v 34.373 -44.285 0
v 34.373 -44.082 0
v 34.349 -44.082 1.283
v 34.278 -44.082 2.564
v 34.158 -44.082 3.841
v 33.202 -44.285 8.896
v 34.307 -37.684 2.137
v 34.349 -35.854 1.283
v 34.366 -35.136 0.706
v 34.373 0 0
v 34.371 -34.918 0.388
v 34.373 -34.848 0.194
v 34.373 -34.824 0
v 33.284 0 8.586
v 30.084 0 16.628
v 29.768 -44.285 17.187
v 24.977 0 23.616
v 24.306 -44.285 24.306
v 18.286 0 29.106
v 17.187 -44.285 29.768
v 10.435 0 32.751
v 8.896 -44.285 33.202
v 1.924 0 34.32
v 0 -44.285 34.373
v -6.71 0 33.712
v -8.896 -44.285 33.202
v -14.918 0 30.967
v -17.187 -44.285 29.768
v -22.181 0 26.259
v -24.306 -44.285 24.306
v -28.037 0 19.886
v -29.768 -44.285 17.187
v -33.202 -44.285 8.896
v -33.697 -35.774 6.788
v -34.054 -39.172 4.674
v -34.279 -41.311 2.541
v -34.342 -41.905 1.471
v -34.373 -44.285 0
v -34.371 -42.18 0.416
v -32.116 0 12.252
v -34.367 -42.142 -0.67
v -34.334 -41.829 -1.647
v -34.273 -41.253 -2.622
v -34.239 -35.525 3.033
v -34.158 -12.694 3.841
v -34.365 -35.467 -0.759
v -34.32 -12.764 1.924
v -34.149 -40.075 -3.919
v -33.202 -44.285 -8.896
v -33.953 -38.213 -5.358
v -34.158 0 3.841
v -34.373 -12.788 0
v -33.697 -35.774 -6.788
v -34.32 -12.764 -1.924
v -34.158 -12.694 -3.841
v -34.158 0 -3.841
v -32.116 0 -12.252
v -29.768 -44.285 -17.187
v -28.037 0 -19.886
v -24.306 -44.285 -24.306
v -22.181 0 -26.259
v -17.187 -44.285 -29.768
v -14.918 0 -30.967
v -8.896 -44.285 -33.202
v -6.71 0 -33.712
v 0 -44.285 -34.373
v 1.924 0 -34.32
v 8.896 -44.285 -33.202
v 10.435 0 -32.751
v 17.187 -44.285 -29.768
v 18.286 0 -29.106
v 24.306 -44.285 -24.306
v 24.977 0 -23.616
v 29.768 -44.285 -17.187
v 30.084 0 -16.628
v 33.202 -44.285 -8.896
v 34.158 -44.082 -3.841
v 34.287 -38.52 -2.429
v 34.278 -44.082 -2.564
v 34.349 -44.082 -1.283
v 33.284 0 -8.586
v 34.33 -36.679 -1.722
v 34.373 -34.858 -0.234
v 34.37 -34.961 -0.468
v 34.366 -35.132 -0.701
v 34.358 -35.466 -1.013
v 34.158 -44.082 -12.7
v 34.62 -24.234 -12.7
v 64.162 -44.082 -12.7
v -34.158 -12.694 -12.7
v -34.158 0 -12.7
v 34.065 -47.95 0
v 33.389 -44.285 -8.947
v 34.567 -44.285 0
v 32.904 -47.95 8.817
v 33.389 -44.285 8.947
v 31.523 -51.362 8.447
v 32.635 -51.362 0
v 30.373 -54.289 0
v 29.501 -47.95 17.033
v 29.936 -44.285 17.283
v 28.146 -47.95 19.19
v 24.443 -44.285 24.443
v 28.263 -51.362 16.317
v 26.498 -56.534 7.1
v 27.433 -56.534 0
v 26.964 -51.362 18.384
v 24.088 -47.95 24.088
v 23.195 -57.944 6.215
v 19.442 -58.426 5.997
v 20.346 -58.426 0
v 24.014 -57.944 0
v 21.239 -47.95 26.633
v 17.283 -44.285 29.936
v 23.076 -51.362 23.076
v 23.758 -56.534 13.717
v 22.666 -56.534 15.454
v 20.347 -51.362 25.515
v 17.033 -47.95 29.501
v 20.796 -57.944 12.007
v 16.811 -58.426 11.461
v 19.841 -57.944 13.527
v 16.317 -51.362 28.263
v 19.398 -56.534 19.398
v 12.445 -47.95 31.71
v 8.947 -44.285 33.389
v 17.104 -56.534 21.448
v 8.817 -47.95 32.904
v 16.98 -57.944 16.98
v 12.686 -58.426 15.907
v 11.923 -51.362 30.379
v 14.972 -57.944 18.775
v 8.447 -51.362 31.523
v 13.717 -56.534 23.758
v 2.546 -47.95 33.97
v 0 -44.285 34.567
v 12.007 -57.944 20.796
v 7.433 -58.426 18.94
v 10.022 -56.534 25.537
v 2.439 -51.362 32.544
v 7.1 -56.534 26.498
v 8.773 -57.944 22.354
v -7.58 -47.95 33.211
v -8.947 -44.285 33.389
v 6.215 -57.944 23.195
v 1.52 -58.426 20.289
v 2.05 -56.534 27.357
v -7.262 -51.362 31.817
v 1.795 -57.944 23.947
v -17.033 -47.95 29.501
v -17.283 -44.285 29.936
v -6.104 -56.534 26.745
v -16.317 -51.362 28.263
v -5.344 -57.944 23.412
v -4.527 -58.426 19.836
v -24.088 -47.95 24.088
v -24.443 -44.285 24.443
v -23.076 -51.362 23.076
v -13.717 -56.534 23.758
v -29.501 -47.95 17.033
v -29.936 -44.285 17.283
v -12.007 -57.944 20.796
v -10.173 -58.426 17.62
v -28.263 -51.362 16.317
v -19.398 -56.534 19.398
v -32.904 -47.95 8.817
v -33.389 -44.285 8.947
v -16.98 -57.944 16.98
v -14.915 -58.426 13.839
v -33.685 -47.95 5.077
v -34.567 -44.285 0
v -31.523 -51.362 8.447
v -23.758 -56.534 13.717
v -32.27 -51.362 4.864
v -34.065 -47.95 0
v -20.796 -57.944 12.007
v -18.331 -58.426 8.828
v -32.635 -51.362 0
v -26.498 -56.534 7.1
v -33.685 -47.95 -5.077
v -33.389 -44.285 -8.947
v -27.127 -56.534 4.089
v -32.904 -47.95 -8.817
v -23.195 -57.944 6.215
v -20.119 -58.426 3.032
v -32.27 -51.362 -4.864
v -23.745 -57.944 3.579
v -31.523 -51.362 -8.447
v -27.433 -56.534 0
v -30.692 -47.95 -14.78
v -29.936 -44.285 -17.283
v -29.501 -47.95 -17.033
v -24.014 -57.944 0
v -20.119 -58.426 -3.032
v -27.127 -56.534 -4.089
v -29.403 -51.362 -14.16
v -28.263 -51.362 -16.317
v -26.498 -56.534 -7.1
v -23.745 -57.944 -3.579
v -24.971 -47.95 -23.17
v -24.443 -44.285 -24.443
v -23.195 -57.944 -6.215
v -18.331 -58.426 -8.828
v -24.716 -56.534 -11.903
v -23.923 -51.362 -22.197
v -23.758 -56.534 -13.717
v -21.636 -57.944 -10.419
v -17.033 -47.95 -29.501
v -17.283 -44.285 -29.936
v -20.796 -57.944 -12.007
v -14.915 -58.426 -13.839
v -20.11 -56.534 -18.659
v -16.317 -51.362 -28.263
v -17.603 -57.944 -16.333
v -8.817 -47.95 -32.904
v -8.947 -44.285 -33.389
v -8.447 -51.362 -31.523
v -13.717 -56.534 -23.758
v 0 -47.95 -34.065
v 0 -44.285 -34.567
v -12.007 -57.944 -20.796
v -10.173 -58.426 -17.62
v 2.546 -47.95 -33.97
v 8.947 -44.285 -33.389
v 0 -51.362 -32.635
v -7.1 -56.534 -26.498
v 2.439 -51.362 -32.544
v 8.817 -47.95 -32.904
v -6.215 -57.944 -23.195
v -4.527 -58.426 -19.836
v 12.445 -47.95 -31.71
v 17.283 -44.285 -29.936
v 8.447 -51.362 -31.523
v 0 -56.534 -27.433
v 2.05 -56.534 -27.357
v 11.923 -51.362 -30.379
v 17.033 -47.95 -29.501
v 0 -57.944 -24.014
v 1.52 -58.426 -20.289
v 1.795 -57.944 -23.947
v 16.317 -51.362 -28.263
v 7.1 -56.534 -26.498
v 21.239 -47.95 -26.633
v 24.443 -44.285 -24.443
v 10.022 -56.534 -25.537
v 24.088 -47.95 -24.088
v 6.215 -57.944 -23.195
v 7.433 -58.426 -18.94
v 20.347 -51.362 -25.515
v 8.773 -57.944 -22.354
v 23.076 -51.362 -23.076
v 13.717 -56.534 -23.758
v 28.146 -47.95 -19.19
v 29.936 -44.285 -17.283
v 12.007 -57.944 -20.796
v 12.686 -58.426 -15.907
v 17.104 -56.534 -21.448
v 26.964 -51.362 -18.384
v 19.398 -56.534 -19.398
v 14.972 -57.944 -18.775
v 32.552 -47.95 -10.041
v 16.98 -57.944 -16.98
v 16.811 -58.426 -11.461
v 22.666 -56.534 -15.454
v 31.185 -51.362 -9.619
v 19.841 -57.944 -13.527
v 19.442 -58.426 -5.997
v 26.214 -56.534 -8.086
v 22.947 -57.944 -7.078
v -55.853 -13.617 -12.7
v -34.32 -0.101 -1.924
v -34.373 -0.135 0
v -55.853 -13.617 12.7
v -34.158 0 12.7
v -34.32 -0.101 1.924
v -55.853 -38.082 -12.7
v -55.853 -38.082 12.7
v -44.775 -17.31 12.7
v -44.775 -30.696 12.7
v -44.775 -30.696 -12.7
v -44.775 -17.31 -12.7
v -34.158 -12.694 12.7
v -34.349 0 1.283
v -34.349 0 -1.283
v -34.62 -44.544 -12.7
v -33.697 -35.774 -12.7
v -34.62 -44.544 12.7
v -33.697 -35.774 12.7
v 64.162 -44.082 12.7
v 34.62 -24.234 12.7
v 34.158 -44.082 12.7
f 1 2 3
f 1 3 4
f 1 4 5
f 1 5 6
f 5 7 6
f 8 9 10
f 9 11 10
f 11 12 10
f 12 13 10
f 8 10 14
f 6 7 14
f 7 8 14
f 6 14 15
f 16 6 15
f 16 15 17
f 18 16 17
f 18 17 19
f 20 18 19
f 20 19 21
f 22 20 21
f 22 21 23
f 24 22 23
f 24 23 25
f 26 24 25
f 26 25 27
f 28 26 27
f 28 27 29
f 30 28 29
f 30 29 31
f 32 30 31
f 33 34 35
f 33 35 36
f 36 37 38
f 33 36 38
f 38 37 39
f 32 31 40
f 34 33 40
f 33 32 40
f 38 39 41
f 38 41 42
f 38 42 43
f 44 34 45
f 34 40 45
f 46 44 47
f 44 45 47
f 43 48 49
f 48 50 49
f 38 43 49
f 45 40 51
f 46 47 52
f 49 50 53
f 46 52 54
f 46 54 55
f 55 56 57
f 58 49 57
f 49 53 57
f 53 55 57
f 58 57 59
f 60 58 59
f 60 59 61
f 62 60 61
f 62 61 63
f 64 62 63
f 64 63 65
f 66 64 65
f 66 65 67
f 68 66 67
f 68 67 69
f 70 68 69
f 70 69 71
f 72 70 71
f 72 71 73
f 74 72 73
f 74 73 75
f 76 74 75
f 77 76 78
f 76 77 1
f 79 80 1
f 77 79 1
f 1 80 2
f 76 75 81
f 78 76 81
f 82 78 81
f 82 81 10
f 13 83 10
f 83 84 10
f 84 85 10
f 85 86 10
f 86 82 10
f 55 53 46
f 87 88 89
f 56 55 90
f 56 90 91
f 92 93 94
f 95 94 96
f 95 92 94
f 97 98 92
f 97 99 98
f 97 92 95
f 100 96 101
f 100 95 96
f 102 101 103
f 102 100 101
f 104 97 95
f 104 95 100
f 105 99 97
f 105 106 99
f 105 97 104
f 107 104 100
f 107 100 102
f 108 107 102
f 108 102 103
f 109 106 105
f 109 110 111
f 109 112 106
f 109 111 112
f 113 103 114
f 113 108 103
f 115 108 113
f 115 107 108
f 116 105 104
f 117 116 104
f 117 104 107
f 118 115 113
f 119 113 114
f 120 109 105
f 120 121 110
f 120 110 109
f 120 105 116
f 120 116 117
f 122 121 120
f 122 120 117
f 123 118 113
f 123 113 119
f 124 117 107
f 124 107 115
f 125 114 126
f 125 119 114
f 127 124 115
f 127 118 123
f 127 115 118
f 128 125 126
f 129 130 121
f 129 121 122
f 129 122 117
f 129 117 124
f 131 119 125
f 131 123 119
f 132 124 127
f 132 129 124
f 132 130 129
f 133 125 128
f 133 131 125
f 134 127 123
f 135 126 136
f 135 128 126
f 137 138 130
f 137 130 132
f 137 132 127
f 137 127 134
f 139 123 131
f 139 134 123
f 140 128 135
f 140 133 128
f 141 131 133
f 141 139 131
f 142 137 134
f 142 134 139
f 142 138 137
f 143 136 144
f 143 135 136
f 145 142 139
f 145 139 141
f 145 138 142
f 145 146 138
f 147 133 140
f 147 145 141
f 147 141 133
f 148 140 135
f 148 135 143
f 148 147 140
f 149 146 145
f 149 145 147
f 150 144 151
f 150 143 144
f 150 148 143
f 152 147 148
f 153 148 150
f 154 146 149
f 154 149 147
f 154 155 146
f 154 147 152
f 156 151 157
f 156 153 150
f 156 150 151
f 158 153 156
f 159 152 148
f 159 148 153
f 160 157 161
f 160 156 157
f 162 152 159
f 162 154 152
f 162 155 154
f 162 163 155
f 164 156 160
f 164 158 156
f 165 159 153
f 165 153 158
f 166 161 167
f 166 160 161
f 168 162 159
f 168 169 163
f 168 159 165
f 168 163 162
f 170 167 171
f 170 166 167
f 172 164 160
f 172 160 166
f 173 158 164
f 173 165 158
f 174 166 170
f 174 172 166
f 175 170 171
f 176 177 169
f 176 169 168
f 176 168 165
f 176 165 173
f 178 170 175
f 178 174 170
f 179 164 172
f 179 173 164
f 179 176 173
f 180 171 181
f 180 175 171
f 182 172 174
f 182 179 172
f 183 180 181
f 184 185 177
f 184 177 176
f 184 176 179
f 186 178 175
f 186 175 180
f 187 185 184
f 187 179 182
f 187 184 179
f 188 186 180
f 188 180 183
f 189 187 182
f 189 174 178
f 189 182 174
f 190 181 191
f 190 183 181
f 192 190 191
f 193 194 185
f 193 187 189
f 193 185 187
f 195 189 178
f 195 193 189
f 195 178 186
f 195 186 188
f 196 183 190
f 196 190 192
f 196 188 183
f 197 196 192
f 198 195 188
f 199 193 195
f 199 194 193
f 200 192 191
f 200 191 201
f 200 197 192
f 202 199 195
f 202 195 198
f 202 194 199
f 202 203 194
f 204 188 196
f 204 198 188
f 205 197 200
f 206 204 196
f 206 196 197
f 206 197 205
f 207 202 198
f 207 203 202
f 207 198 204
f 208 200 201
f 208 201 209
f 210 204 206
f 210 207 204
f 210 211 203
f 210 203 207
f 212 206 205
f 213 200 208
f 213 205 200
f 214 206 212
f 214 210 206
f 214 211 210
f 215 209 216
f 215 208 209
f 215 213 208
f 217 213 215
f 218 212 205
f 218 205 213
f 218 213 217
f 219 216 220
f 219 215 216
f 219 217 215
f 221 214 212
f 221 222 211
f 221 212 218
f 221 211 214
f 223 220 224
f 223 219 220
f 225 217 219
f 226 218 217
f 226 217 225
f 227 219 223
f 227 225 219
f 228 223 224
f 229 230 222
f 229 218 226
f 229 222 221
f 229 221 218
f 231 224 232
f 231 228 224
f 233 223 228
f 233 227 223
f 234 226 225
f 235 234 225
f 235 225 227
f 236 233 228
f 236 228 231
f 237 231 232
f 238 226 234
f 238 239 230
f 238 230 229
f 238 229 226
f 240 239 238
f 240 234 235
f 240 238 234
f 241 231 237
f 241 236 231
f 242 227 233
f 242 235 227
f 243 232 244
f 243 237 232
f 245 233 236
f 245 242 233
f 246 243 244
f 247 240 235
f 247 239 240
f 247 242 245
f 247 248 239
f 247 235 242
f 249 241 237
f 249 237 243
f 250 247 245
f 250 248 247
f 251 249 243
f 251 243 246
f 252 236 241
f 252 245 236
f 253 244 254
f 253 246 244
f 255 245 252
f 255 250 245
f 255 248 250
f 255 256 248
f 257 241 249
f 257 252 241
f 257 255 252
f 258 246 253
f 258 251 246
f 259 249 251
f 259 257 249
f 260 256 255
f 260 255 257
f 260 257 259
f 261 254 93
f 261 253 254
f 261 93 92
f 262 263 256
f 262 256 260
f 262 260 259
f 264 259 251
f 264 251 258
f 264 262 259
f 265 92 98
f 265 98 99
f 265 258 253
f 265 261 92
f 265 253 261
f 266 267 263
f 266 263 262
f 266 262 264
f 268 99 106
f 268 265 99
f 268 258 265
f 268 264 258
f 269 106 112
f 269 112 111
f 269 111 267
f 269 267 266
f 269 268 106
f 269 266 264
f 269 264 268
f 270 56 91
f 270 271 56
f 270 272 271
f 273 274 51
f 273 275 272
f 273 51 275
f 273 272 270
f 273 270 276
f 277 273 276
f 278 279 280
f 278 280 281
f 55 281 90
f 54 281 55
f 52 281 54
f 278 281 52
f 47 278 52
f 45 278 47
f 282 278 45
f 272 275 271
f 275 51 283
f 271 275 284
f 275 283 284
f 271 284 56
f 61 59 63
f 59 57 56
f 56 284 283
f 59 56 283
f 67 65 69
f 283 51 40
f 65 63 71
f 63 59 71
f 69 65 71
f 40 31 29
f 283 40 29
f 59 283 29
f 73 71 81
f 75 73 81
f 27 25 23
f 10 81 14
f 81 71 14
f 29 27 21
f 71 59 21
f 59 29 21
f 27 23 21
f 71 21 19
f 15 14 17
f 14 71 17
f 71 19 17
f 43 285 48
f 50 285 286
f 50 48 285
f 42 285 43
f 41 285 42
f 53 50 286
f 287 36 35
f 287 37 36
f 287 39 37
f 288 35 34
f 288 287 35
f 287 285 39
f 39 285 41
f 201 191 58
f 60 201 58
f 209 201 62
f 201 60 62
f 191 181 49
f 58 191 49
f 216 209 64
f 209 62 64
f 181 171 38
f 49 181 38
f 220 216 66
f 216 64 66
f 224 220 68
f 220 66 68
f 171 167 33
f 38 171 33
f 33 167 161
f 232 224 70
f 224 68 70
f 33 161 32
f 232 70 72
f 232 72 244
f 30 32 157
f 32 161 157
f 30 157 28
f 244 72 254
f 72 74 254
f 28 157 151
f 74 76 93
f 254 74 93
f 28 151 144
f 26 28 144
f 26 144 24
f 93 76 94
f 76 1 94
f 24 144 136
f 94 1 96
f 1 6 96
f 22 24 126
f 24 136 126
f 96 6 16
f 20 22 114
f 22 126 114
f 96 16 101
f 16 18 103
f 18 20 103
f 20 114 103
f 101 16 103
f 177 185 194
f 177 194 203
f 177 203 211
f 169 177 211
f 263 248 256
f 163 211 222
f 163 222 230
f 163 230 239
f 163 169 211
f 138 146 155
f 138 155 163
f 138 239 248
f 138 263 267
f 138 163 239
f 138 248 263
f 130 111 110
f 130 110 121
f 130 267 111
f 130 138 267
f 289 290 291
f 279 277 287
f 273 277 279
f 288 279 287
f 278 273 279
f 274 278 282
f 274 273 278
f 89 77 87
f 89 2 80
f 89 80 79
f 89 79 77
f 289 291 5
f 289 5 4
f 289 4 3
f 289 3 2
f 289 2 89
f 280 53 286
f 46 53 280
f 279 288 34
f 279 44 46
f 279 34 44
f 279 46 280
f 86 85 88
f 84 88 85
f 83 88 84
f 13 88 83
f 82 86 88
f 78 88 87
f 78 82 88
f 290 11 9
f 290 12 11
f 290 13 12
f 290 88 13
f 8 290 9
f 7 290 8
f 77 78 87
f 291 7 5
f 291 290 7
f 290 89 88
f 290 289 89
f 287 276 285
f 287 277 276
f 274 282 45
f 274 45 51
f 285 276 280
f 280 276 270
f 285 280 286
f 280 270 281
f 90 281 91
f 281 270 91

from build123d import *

# Parameters (mm, degrees)
F0_R     = 34.3734140818
F1_DEPTH = 44.2854
F2_R     = 34.5672113186
F3_DEPTH = 14.14017
F6_DEPTH = 12.7
F8_DEPTH = 12.7


# Not quite as in the source:
# - a fillet or chamfer that OpenCascade refuses, or shapes differently, is made with other operations: its cross-section is extruded or revolved along the edge and cut away or added


with BuildPart() as f1:
    # F0 (on Front) → F1 (new body)
    with BuildSketch(Plane.XZ):
        Circle(F0_R)
    extrude(amount=F1_DEPTH)

    # F2 (on face) → F3 (join)
    with BuildSketch(Plane.XZ.offset(44.2854)):
        Circle(F2_R)
    extrude(amount=F3_DEPTH)

    # F4: fillet of radius 14.2211905527 on 1 edges, made by hand

    # F4_s1 → F4_t2 (revolve, cut)
    with BuildSketch(Plane.XY):
        with BuildLine():
            ThreePointArc((34.5672113186, -44.2043794473), (30.4019210422, -54.2602797237), (20.3460207659, -58.42557))
            Line((20.3460207659, -58.42557), (34.5672113186, -58.42557))
            Line((34.5672113186, -58.42557), (34.5672113186, -44.2043794473))
        make_face()
    revolve(axis=Axis((0, -58.42557, 0), (0, -1, 0)), mode=Mode.SUBTRACT)

    # F5 (on Top) → F6 (join, symmetric)
    with BuildSketch(Plane.XY):
        Polygon((34.6197038889, -24.2337957025), (34.1581068933, -44.0824255347), (64.1618520021, -44.0824255347), align=None)
    extrude(amount=F6_DEPTH, both=True)

    # F7 (on Top) → F8 (join, symmetric)
    with BuildSketch(Plane.XY):
        Polygon((-55.8531209826, -38.0816757679), (-34.6197001636, -44.544018805), (-33.6965061724, -35.7736945152), (-44.7748154402, -30.6961387396), (-44.7748154402, -17.3098519444), (-34.158103168, -12.6938922331), (-34.158103168, 0), (-55.8531209826, -13.6170834303), align=None)
    extrude(amount=F8_DEPTH, both=True)


solid = f1.part
